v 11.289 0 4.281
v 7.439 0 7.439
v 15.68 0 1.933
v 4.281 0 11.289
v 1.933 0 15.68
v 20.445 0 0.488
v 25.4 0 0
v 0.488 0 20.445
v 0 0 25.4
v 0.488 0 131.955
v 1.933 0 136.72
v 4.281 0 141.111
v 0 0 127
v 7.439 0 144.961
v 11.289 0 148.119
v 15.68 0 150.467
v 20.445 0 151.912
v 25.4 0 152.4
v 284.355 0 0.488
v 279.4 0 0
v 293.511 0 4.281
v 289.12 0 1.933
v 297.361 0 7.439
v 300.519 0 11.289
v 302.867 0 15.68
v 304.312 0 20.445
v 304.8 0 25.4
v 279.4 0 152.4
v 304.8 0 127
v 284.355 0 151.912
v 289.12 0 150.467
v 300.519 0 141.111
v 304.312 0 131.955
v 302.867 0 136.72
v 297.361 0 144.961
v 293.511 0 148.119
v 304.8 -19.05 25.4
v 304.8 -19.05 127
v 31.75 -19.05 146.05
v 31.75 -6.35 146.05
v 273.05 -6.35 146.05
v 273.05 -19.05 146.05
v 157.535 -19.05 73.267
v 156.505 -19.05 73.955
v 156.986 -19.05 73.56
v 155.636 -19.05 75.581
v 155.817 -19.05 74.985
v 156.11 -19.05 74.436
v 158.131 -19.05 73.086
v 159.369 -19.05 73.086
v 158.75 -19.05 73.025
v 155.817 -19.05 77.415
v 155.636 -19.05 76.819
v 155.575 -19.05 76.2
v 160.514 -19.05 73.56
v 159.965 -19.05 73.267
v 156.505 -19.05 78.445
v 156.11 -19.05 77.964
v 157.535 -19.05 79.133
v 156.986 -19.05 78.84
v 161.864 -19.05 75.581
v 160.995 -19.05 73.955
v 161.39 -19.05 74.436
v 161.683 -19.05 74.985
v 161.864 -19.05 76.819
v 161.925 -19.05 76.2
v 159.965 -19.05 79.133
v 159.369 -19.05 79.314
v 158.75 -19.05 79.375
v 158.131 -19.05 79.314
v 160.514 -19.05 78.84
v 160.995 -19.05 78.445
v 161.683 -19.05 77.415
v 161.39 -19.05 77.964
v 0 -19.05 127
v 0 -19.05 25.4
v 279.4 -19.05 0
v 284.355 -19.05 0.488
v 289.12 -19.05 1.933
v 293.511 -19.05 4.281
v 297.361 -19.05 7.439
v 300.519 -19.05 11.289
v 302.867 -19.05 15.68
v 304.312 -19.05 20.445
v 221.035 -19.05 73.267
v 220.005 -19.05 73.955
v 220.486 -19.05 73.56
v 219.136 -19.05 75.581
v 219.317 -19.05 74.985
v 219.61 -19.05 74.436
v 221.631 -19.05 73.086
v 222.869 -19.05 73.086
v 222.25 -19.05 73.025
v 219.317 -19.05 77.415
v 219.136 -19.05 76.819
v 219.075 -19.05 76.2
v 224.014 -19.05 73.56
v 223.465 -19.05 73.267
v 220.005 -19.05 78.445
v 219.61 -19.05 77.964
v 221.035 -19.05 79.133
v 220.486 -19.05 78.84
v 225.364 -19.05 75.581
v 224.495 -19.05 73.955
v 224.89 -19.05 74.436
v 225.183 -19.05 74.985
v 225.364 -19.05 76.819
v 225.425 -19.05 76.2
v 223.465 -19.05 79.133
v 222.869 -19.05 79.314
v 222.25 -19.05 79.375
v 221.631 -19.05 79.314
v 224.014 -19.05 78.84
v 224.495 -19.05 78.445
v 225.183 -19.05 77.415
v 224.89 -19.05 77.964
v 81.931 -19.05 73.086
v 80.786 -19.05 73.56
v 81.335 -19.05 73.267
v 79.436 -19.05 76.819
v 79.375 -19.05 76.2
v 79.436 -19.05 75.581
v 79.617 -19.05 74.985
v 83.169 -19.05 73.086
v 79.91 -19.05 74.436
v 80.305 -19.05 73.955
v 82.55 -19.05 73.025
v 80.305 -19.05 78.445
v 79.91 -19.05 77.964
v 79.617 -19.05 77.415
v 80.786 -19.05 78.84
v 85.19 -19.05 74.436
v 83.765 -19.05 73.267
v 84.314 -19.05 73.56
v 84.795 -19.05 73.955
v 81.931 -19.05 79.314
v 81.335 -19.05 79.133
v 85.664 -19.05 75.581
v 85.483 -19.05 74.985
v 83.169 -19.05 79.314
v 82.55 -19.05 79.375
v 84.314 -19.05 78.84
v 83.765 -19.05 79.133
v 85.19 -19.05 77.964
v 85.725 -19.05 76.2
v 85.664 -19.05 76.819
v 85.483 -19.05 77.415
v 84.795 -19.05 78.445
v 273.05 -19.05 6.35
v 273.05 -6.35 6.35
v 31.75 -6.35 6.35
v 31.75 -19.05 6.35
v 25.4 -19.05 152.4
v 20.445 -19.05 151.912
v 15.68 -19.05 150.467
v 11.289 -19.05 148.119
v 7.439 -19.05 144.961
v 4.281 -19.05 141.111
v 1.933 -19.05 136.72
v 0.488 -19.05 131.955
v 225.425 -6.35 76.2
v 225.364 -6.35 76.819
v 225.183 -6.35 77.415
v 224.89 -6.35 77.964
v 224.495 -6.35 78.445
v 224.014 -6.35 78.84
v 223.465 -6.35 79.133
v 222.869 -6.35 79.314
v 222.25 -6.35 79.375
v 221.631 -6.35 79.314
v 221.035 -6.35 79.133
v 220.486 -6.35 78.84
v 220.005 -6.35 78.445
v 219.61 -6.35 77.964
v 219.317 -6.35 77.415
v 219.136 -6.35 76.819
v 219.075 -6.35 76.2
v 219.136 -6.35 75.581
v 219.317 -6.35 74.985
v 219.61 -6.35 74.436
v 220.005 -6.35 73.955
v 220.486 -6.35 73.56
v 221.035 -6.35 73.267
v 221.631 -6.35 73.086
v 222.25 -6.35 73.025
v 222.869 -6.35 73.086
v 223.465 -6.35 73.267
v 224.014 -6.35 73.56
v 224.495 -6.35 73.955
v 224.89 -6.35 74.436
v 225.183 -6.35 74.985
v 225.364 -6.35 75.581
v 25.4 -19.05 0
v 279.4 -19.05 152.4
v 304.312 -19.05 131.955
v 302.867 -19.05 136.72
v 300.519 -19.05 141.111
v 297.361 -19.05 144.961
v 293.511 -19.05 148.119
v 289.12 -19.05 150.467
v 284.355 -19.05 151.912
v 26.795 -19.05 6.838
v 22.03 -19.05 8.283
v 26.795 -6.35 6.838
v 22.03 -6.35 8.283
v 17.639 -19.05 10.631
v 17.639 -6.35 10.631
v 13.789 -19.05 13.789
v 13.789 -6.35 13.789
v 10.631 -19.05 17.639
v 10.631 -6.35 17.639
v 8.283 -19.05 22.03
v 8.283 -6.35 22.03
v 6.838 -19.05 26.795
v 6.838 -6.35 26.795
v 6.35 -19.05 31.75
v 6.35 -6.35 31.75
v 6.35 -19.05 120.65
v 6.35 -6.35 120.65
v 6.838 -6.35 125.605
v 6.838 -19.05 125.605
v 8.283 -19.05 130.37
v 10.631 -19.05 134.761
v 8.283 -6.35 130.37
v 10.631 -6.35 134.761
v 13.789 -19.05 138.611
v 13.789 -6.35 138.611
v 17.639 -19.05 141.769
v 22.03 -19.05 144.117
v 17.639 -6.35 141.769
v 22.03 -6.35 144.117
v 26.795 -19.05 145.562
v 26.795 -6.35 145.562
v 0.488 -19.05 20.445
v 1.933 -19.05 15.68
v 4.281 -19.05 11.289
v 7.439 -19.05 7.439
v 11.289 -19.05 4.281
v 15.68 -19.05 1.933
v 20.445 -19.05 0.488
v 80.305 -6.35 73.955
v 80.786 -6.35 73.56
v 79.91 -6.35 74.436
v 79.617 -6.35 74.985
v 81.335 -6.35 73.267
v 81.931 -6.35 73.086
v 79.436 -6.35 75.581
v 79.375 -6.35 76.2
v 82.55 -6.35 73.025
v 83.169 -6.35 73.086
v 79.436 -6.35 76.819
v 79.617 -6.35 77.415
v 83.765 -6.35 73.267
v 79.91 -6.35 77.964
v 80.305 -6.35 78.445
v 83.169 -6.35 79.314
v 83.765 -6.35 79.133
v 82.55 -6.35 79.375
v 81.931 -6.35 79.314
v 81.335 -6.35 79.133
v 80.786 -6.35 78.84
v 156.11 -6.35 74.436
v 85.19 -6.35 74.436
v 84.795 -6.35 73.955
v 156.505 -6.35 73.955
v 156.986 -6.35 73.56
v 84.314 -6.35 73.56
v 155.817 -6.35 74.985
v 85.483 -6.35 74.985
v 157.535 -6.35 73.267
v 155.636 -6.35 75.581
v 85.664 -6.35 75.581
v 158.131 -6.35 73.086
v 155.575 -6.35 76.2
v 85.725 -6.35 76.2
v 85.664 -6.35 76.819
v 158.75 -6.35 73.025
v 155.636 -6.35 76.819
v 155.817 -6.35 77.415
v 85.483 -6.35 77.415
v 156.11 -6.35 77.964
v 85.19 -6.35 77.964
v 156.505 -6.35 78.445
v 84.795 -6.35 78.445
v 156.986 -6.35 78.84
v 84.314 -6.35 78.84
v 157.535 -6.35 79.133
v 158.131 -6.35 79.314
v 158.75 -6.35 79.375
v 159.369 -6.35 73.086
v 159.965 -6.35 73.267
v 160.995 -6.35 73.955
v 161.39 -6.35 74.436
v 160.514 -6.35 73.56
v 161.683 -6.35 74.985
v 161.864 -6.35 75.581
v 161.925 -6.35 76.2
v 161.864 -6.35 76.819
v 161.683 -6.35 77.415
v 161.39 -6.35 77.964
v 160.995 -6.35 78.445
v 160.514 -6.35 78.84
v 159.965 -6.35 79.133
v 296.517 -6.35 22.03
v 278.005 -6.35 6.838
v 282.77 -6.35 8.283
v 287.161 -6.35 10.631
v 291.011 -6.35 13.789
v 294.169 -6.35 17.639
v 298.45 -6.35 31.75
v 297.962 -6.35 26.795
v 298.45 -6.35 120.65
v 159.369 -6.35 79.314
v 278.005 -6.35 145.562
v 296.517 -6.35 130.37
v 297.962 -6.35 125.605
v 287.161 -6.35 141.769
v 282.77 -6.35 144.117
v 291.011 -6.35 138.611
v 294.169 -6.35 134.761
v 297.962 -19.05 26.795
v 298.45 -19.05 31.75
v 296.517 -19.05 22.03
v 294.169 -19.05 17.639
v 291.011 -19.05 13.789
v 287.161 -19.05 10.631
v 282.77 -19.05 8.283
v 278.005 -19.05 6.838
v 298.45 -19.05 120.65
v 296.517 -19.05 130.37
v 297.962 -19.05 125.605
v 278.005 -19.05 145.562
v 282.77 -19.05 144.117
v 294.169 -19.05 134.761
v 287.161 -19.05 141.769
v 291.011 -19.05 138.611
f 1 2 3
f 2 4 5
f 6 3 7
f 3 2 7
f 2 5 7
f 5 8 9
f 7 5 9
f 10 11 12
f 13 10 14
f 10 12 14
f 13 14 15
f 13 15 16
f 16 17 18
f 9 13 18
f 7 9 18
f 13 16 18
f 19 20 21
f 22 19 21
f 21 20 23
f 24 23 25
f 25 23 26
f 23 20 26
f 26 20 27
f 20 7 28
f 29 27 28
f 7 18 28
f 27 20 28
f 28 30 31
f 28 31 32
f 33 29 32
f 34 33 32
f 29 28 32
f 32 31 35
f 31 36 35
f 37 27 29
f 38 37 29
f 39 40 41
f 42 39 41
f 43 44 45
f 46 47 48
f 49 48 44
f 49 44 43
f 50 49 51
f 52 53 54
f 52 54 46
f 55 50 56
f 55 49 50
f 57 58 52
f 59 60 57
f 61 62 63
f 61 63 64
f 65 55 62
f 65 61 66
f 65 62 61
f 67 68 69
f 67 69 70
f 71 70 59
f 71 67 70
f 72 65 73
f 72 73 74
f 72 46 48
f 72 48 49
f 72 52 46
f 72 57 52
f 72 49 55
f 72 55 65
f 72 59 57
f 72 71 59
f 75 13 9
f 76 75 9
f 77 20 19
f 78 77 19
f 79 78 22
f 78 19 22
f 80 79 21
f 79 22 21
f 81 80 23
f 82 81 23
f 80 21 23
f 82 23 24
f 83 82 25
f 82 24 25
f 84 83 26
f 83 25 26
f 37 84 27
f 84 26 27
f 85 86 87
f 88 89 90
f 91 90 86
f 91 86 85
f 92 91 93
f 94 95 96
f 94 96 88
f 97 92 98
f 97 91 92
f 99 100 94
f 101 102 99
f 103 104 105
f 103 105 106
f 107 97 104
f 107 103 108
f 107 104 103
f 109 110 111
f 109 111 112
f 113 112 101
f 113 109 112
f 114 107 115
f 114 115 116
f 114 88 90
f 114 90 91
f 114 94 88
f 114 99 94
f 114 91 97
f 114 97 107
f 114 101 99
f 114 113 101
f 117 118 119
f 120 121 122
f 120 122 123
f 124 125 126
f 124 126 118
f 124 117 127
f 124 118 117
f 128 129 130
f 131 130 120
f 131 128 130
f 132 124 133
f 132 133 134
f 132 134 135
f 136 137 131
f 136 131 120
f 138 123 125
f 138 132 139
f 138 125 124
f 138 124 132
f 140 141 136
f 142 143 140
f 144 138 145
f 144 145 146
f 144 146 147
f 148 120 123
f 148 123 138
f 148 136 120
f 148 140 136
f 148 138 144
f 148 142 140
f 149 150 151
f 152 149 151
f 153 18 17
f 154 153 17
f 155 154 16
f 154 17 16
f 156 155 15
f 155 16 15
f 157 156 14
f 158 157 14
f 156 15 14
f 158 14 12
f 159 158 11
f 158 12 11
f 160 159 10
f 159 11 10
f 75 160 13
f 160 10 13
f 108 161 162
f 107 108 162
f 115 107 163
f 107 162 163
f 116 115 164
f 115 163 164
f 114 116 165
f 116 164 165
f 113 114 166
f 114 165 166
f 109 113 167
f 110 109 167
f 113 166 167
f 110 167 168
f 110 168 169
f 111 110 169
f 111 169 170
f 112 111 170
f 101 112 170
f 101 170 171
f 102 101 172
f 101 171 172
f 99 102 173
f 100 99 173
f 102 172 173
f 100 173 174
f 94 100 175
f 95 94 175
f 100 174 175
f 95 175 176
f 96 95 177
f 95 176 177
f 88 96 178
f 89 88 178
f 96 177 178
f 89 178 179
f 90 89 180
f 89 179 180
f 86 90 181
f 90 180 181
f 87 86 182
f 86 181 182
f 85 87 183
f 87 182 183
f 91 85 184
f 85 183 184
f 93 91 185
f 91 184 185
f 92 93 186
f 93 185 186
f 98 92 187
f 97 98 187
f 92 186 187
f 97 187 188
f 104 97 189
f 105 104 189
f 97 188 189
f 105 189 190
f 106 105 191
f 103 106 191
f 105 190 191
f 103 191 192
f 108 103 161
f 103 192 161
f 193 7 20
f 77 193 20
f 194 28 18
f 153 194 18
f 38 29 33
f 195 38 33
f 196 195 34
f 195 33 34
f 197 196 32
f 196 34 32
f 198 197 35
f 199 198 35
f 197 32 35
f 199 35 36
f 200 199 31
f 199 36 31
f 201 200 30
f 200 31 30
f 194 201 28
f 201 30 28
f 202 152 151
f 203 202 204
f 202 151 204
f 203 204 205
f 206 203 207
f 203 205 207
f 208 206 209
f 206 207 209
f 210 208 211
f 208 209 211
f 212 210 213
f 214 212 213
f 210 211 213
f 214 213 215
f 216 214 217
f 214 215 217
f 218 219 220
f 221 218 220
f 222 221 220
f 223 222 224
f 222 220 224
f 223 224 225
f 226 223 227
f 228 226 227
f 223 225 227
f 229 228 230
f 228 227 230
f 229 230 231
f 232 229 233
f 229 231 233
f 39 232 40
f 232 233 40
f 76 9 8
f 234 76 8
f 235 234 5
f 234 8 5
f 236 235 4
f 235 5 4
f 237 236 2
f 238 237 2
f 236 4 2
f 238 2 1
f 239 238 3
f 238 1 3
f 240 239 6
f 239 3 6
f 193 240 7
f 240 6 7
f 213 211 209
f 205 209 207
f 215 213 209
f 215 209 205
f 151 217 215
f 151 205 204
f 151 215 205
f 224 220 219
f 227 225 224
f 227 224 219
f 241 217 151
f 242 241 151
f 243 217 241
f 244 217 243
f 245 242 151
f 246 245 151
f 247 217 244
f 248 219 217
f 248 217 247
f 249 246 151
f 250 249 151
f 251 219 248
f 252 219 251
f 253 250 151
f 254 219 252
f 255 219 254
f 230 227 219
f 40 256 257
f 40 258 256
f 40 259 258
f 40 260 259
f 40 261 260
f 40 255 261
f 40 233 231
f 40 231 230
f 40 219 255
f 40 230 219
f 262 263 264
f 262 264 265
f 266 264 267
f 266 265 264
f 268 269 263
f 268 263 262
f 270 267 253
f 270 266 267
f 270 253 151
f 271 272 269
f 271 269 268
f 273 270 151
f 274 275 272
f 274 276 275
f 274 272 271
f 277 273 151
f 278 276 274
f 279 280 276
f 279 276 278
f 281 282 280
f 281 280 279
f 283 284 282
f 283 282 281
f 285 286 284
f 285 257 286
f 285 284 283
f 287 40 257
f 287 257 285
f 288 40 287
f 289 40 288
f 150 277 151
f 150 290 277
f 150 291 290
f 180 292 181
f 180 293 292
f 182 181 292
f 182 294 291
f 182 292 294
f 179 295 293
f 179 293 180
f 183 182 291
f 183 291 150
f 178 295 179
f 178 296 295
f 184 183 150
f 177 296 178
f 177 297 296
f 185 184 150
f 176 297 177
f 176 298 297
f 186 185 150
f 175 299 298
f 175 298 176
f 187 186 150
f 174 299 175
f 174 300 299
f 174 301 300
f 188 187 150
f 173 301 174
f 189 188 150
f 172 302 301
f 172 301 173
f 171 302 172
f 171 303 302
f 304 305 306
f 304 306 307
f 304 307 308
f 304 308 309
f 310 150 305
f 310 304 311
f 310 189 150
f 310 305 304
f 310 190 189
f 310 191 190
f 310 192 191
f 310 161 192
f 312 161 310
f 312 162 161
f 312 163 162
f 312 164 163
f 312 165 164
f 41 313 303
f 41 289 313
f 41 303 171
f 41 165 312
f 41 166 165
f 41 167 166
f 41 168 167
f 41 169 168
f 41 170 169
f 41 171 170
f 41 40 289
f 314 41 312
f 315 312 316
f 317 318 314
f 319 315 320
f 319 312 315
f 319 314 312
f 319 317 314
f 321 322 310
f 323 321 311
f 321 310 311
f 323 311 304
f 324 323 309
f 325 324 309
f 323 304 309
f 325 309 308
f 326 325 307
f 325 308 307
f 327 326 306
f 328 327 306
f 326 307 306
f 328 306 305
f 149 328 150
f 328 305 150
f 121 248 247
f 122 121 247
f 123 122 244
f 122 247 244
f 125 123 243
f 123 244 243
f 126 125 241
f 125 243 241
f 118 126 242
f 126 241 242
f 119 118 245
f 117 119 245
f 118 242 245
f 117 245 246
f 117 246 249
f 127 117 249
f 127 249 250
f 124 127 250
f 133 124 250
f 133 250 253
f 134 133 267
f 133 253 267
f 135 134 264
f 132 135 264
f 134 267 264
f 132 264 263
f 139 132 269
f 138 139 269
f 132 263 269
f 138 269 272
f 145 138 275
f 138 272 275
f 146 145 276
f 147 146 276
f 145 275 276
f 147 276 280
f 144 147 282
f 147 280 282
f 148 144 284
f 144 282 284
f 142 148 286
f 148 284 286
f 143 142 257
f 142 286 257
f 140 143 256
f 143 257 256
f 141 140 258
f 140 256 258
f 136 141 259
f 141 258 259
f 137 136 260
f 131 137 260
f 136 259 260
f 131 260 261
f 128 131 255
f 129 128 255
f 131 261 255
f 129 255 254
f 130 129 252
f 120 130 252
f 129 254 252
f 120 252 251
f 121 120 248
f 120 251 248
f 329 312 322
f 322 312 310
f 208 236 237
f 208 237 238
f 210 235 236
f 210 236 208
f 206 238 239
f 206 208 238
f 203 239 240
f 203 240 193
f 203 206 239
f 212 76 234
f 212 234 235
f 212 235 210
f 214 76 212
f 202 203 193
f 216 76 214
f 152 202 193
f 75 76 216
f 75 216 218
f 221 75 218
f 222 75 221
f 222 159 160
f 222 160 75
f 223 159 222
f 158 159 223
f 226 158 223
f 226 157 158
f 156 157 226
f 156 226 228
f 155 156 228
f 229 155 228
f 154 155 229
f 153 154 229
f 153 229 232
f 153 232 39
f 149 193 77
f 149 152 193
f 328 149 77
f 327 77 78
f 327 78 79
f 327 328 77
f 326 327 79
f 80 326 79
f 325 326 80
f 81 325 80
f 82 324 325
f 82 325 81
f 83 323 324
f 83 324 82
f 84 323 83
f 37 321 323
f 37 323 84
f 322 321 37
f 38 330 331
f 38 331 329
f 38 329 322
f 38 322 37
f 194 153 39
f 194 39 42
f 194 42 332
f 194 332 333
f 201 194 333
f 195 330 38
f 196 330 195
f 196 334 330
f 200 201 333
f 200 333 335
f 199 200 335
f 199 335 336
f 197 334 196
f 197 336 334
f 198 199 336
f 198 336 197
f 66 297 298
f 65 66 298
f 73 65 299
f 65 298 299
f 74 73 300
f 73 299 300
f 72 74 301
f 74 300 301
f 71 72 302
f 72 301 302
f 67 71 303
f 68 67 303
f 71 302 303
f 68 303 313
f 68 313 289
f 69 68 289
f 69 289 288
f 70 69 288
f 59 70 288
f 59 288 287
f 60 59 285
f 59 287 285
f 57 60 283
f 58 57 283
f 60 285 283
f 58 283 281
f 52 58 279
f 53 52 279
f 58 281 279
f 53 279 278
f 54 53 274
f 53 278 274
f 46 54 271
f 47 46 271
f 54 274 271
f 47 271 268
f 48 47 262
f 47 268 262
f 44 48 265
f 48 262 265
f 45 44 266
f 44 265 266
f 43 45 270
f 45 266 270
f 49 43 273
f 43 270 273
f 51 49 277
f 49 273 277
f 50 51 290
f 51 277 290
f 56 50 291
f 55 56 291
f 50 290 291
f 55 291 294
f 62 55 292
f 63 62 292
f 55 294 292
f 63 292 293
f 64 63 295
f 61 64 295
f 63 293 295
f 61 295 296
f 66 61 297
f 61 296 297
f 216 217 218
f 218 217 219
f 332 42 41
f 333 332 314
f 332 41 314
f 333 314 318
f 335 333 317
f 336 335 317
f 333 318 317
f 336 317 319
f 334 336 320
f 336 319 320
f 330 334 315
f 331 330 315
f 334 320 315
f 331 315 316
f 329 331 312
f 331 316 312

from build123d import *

# Parameters (mm, degrees)
F1_DEPTH = 19.05
F2_DEPTH = 6.35
F4_DEPTH = 12.7


with BuildPart() as f1:
    # F0 (on Front) → F1 (new body)
    with BuildSketch(Plane.XZ):
        with BuildLine():
            ThreePointArc((0, 25.4), (7.4394877579, 7.4394877579), (25.4, 0))
            Line((25.4, 0), (279.4, 0))
            ThreePointArc((279.4, 0), (297.3605122421, 7.4394877579), (304.8, 25.4))
            Line((304.8, 25.4), (304.8, 76.2))
            Line((304.8, 76.2), (298.45, 76.2))
            Line((298.45, 76.2), (298.45, 31.75))
            ThreePointArc((298.45, 31.75), (291.0105122421, 13.7894877579), (273.05, 6.35))
            Line((273.05, 6.35), (31.75, 6.35))
            ThreePointArc((31.75, 6.35), (13.7894877579, 13.7894877579), (6.35, 31.75))
            Line((6.35, 31.75), (6.35, 76.2))
            Line((6.35, 76.2), (0, 76.2))
            Line((0, 76.2), (0, 25.4))
        make_face()
        with BuildLine():
            Line((0, 127), (0, 76.2))
            Line((0, 76.2), (6.35, 76.2))
            Line((6.35, 76.2), (6.35, 120.65))
            ThreePointArc((6.35, 120.65), (13.7894877579, 138.6105122421), (31.75, 146.05))
            Line((31.75, 146.05), (273.05, 146.05))
            ThreePointArc((273.05, 146.05), (291.0105122421, 138.6105122421), (298.45, 120.65))
            Line((298.45, 120.65), (298.45, 76.2))
            Line((298.45, 76.2), (304.8, 76.2))
            Line((304.8, 76.2), (304.8, 127))
            ThreePointArc((304.8, 127), (297.3605122421, 144.9605122421), (279.4, 152.4))
            Line((279.4, 152.4), (25.4, 152.4))
            ThreePointArc((25.4, 152.4), (7.4394877579, 144.9605122421), (0, 127))
        make_face()
    extrude(amount=F1_DEPTH)

    # F0 (on Front) → F2 (join)
    with BuildSketch(Plane.XZ):
        with BuildLine():
            Line((6.35, 120.65), (6.35, 76.2))
            Line((6.35, 76.2), (298.45, 76.2))
            Line((298.45, 76.2), (298.45, 120.65))
            ThreePointArc((298.45, 120.65), (291.0105122421, 138.6105122421), (273.05, 146.05))
            Line((273.05, 146.05), (31.75, 146.05))
            ThreePointArc((31.75, 146.05), (13.7894877579, 138.6105122421), (6.35, 120.65))
        make_face()
        with BuildLine():
            Line((298.45, 76.2), (6.35, 76.2))
            Line((6.35, 76.2), (6.35, 31.75))
            ThreePointArc((6.35, 31.75), (13.7894877579, 13.7894877579), (31.75, 6.35))
            Line((31.75, 6.35), (273.05, 6.35))
            ThreePointArc((273.05, 6.35), (291.0105122421, 13.7894877579), (298.45, 31.75))
            Line((298.45, 31.75), (298.45, 76.2))
        make_face()
    extrude(amount=F2_DEPTH)

    # F3 (on face) → F4 (join)
    with BuildSketch(Plane.XZ.offset(6.35)):
        with BuildLine():
            Line((79.375, 76.2), (85.725, 76.2))
            ThreePointArc((85.725, 76.2), (82.55, 79.375), (79.375, 76.2))
        make_face()
        with BuildLine():
            ThreePointArc((79.375, 76.2), (82.55, 73.025), (85.725, 76.2))
            Line((85.725, 76.2), (79.375, 76.2))
        make_face()
        with BuildLine():
            ThreePointArc((155.575, 76.2), (158.75, 73.025), (161.925, 76.2))
            Line((161.925, 76.2), (155.575, 76.2))
        make_face()
        with BuildLine():
            Line((155.575, 76.2), (161.925, 76.2))
            ThreePointArc((161.925, 76.2), (158.75, 79.375), (155.575, 76.2))
        make_face()
        with BuildLine():
            ThreePointArc((219.075, 76.2), (222.25, 73.025), (225.425, 76.2))
            Line((225.425, 76.2), (219.075, 76.2))
        make_face()
        with BuildLine():
            Line((219.075, 76.2), (225.425, 76.2))
            ThreePointArc((225.425, 76.2), (222.25, 79.375), (219.075, 76.2))
        make_face()
    extrude(amount=F4_DEPTH)


solid = f1.part
